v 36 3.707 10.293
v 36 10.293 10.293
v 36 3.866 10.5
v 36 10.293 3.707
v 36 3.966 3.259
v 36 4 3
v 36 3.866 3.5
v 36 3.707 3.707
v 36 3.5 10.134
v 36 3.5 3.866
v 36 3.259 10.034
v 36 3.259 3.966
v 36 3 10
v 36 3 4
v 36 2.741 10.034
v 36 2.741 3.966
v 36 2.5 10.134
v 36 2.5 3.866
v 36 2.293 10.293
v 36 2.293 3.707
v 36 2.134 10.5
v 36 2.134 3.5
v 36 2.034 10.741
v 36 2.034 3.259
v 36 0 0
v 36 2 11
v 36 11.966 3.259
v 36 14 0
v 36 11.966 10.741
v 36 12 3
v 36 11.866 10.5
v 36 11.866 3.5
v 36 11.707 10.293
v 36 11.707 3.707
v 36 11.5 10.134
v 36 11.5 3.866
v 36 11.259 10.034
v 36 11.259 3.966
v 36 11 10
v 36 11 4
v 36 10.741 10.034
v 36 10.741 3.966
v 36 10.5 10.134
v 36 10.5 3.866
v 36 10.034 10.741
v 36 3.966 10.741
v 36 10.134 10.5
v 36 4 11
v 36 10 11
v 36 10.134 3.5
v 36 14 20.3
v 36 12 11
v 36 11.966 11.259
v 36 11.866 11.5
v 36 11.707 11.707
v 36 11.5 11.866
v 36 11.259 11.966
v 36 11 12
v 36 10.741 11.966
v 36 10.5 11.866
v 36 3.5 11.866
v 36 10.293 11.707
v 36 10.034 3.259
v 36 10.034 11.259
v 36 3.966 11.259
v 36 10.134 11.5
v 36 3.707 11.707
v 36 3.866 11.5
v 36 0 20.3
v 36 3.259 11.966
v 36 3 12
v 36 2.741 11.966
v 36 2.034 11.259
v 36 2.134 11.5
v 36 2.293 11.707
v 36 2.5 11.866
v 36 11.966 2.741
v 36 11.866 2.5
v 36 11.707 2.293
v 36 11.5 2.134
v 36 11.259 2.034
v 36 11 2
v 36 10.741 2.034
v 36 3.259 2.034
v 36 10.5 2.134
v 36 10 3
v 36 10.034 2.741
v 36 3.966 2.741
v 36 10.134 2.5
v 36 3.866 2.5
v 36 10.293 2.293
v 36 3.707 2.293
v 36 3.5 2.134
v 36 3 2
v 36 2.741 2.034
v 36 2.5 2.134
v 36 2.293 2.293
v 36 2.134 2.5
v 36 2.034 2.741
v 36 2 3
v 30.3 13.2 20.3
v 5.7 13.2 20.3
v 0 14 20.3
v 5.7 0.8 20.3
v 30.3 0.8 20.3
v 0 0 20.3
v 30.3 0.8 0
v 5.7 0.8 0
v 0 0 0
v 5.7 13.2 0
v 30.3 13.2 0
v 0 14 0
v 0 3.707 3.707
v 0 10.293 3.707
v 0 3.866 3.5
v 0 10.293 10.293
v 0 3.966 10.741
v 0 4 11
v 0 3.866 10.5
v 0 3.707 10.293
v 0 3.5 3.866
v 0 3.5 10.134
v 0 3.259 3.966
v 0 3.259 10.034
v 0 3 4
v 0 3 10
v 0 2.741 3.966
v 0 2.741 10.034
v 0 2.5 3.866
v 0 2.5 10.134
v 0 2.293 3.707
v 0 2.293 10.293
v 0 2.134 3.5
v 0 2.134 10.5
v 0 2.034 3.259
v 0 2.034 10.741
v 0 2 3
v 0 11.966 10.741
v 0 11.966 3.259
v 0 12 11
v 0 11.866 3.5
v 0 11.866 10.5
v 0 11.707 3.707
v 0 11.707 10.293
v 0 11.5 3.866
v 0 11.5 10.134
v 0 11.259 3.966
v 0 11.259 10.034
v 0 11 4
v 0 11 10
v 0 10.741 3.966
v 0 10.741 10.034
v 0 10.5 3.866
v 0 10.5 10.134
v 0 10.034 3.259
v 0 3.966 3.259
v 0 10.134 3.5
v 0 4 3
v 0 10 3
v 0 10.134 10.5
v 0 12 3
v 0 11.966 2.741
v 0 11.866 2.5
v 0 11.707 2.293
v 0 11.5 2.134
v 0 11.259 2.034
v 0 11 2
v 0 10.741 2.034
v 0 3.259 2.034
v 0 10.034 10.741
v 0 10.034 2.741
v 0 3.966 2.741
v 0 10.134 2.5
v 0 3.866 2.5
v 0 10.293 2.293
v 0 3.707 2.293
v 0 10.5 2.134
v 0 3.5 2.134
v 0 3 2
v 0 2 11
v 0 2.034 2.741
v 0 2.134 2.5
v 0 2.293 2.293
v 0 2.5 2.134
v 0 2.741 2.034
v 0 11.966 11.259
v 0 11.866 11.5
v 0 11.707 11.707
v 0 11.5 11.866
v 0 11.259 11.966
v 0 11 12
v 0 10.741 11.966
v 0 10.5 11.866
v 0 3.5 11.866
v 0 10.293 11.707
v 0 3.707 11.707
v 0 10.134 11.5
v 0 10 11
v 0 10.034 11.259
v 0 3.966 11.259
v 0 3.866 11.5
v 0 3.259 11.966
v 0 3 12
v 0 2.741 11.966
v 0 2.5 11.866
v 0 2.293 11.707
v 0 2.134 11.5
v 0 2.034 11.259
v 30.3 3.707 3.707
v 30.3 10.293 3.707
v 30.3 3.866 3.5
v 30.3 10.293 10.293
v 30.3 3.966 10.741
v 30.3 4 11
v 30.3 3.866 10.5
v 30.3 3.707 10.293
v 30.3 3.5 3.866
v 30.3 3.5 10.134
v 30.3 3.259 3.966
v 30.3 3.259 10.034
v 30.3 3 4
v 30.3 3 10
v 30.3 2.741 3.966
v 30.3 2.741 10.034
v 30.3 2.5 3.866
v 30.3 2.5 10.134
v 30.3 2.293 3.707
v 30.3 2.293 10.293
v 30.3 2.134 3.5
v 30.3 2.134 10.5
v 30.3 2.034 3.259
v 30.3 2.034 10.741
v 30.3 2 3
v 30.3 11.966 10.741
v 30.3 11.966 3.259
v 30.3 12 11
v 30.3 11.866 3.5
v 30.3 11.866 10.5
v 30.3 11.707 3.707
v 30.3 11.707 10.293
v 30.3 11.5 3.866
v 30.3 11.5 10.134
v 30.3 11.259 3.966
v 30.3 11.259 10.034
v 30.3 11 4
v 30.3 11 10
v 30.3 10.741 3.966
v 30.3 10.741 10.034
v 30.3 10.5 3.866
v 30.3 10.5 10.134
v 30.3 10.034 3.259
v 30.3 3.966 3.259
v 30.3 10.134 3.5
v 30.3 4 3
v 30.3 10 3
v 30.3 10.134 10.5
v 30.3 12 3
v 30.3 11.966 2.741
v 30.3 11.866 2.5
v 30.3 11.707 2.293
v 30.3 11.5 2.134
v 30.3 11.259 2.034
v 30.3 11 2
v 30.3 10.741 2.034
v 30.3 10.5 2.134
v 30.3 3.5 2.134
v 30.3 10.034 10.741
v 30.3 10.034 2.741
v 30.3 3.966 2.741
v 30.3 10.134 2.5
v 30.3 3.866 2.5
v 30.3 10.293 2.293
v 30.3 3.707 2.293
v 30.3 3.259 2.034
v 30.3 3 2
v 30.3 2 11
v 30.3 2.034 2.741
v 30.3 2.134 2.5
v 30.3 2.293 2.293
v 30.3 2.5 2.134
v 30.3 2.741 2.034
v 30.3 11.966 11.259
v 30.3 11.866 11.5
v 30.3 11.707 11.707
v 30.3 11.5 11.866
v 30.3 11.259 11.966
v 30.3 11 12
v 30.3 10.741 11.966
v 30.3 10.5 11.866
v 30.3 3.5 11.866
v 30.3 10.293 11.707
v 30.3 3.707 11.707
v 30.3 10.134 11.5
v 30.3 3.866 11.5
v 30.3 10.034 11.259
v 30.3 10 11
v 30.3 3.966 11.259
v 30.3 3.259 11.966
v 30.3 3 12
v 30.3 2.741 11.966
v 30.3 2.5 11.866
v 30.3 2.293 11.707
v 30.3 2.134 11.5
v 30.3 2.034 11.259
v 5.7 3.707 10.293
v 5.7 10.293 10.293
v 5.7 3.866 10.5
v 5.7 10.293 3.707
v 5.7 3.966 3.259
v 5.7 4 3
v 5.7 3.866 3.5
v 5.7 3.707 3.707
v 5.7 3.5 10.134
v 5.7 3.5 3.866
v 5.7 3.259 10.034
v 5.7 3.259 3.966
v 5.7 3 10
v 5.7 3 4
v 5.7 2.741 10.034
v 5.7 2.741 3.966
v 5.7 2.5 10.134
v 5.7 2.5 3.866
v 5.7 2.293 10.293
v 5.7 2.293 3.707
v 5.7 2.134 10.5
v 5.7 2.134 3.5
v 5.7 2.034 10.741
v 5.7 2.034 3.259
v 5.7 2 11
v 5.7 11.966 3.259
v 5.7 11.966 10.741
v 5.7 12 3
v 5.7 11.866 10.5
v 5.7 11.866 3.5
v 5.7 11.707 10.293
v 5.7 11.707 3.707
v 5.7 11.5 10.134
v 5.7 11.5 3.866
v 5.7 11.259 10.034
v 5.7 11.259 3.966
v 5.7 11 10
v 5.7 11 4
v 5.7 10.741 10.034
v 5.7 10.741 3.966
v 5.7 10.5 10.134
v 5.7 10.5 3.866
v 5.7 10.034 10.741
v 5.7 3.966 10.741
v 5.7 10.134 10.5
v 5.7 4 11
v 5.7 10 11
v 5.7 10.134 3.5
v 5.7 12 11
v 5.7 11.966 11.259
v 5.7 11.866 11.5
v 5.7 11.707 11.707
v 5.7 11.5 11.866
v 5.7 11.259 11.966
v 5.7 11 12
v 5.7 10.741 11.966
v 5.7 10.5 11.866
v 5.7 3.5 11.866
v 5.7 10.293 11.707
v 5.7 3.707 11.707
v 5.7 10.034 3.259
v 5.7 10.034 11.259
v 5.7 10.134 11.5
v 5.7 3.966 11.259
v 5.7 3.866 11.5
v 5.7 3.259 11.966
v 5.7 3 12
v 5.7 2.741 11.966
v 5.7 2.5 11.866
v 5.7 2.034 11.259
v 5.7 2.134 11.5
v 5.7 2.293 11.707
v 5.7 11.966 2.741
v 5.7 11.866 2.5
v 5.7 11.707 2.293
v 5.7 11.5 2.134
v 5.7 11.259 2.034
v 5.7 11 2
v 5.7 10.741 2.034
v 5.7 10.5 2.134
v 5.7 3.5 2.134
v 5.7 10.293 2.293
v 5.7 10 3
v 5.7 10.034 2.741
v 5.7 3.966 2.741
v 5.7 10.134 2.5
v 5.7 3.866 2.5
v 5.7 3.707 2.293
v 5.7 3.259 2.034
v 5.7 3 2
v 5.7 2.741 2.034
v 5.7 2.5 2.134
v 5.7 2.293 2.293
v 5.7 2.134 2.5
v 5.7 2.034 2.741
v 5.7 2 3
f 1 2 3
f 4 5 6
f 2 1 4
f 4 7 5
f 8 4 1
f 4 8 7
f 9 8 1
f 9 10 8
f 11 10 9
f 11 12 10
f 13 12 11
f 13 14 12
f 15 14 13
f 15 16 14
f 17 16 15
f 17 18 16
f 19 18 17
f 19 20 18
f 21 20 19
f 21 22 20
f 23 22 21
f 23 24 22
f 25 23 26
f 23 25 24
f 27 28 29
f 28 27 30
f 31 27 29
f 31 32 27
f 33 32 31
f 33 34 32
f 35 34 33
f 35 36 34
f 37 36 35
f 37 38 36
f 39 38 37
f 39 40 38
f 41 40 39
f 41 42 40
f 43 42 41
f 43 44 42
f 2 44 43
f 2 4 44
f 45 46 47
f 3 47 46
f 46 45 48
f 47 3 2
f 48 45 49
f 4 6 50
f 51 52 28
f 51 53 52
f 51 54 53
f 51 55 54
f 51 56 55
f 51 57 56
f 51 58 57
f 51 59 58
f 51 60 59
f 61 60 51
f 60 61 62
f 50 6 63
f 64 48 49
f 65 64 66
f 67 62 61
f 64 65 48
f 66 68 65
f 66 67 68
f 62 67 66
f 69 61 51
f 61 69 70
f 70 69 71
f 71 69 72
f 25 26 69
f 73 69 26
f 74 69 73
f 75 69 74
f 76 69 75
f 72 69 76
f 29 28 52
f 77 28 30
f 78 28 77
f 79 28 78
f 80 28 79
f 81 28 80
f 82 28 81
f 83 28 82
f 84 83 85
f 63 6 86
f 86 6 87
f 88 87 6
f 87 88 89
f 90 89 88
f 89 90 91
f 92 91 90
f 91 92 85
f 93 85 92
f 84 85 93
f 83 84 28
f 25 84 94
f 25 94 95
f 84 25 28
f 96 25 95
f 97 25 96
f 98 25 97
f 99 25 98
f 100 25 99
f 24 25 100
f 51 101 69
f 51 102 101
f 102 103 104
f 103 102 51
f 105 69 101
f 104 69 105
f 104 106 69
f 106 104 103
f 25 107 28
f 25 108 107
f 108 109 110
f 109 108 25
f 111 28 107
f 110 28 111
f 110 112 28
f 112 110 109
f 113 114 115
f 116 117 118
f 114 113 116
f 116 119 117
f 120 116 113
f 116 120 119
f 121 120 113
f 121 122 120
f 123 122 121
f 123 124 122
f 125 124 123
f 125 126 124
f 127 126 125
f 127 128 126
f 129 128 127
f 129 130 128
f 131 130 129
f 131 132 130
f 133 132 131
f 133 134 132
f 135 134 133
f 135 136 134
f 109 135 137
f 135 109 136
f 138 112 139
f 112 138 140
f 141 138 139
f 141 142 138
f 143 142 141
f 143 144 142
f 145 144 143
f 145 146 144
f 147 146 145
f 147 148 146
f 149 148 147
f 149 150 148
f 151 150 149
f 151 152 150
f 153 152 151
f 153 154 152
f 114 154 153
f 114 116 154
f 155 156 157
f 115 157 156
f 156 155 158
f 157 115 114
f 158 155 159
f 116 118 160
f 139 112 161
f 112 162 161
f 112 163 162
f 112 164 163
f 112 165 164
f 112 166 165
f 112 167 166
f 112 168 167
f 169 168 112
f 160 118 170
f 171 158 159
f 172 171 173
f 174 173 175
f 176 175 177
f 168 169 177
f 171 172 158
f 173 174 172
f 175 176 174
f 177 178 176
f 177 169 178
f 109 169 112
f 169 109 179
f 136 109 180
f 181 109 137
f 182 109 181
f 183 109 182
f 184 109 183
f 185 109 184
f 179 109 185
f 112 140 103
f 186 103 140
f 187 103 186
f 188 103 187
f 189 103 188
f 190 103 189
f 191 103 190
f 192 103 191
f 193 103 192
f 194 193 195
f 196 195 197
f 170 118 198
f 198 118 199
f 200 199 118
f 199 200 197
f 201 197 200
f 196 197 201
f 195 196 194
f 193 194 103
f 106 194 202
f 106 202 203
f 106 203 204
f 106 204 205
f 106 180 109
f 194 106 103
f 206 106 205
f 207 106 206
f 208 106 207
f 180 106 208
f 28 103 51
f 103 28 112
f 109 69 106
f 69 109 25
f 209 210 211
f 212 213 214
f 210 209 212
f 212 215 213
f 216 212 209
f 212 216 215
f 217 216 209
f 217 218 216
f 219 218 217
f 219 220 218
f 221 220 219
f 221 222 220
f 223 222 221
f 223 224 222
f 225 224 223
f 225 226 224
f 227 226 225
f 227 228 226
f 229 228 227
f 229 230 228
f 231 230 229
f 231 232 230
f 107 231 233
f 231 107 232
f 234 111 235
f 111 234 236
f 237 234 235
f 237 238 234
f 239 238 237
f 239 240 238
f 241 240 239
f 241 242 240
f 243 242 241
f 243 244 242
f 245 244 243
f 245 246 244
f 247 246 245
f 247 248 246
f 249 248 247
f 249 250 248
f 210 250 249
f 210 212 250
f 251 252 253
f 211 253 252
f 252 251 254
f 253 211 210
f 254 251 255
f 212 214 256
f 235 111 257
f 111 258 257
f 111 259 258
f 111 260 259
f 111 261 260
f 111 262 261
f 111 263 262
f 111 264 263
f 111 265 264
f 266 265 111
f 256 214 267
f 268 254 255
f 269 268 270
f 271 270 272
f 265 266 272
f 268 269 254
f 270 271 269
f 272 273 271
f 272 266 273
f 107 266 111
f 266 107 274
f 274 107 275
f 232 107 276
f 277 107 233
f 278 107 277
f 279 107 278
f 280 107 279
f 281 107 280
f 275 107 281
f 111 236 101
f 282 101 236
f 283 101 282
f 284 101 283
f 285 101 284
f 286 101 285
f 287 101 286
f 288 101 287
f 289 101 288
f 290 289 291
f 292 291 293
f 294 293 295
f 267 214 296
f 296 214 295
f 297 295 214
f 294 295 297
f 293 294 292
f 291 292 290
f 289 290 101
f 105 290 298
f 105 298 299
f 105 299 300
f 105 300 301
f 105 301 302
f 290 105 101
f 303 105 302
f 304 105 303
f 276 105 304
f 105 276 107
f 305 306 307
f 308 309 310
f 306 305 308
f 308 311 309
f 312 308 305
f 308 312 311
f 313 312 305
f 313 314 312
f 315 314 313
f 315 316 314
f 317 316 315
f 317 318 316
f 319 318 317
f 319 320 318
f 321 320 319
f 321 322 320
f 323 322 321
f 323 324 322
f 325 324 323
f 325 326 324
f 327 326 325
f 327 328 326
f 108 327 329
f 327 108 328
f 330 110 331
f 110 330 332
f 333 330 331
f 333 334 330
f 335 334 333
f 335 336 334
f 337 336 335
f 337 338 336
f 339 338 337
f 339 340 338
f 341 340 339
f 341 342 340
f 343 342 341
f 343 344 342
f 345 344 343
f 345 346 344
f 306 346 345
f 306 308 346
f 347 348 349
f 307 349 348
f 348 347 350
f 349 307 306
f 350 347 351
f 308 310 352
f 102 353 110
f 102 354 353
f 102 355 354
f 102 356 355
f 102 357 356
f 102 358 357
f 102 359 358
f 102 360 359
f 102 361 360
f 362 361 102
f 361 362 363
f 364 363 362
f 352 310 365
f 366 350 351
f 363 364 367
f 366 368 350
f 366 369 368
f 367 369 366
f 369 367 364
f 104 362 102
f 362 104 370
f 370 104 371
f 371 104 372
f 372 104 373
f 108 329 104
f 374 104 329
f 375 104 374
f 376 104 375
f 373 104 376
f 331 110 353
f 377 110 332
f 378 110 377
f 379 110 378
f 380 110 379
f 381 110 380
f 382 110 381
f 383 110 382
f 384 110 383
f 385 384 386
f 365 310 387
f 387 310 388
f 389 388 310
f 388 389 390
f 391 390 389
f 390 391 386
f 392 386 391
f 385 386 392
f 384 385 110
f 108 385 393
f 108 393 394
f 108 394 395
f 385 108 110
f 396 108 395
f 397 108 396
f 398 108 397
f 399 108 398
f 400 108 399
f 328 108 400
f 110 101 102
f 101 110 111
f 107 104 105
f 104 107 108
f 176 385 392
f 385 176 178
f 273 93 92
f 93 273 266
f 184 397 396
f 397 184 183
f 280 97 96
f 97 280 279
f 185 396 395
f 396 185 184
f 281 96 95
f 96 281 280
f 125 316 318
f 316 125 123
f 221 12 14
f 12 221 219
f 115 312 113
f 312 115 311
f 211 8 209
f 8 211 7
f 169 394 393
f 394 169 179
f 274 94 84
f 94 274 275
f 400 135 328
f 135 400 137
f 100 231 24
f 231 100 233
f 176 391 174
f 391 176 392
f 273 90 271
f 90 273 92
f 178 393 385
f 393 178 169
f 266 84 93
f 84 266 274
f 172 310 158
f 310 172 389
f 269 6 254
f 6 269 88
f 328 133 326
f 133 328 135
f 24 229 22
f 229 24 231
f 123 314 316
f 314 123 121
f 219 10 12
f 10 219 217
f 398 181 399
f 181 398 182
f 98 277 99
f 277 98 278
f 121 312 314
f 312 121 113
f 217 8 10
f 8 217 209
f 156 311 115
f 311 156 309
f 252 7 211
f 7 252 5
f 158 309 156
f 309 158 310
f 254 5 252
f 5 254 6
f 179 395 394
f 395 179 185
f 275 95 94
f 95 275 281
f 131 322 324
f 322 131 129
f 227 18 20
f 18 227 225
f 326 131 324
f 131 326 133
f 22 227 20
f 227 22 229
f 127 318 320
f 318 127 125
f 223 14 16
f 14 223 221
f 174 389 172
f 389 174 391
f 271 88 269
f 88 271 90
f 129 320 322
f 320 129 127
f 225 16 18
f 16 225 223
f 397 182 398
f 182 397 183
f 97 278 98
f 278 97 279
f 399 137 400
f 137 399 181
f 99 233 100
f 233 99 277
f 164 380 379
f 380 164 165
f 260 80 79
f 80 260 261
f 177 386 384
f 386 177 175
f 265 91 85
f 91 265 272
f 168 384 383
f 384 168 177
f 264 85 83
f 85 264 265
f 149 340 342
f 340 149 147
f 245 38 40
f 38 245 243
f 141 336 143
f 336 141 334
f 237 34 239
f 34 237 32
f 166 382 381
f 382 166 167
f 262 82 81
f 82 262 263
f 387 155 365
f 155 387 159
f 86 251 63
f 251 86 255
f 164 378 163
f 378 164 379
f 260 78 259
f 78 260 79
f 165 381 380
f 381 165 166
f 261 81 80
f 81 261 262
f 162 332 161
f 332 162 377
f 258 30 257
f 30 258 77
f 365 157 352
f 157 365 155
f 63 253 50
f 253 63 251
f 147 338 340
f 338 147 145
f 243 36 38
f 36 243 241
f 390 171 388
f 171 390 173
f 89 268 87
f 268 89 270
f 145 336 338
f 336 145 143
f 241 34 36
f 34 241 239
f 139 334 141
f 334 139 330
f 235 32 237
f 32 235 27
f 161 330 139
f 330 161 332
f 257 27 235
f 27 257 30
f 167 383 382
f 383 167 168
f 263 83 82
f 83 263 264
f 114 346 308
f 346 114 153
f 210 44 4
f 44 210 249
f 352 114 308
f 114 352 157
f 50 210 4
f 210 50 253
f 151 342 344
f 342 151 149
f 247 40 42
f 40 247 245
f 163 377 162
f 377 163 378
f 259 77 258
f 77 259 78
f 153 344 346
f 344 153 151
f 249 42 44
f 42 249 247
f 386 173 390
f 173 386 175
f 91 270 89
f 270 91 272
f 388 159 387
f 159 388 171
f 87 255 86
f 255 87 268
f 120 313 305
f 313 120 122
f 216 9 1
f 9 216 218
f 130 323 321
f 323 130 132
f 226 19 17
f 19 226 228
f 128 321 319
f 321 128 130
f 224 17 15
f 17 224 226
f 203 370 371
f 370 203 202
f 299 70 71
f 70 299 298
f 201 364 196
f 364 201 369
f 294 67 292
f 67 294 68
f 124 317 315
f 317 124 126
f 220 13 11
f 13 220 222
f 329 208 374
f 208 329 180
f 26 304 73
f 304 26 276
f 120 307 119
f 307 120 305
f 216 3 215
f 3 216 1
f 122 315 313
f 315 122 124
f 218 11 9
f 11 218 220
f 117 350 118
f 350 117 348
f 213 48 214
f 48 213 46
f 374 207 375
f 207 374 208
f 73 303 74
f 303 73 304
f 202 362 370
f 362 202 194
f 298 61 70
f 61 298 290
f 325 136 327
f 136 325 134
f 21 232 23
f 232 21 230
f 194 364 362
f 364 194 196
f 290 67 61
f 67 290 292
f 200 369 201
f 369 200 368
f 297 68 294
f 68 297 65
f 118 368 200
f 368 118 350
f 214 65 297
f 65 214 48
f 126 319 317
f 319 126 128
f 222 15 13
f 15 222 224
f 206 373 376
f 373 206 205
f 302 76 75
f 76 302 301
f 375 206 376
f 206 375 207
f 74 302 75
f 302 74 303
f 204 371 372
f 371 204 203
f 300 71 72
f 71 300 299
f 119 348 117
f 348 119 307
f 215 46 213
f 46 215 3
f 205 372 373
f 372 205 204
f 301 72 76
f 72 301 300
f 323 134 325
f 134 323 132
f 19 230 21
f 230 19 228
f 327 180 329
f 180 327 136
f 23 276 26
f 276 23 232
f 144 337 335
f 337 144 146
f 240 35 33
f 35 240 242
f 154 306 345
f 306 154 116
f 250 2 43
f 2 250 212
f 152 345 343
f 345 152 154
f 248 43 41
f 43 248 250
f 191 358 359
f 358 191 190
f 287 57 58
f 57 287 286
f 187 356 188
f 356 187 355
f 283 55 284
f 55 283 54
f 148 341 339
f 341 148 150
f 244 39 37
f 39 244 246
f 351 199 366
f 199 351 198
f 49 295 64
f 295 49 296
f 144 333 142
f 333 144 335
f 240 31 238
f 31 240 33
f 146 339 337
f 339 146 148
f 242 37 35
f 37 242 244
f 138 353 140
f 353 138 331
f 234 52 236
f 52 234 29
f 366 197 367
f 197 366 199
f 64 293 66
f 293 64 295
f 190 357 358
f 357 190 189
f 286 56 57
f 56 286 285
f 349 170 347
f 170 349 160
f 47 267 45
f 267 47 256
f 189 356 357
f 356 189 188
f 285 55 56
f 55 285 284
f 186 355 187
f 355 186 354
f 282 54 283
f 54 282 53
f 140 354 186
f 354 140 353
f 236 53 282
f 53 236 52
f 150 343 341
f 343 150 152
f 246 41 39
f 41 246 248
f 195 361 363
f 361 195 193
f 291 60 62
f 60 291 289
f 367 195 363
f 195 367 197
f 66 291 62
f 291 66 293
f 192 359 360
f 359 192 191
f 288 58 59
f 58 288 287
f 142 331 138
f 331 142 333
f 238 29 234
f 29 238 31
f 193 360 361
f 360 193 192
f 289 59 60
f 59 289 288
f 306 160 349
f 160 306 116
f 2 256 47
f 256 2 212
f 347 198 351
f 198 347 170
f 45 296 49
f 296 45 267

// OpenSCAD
// file: servo_9g.scad
//servo_9g(false);

//use<hub_mount.scad>
use<MCAD/nuts_and_bolts.scad>
$fn = 24;
//x,y,z => l,w,h
servo_l         = 12;
servo_w         = 23;
body_h          = 23;

servo_h         = 27; //not used in code

wing_w          = 5;
wing_h          = 2.33;
wing_place      = 18.3;   
hole_offset     = 2.5;    //not checked
mount_hole_r    = 2/2;
mount_slot      = 1;

servo_ww        = servo_w+wing_w*2; // not used in code but is handy number

hub_h           = 4;
small_hub_r     = 5.68/2;  
horn_r          = 4.66/2;
horn_h          = 3;

wire_l          = 4;
wire_w          = 1.5;
wire_h          = 1;
wire_place      = 4.8;

servo_full_w    = servo_w+wing_w*2;

//servo_9g(true, false);
module servo_9g(hole=false, wings = true) {
    //if a differnce is applied and you want 
    if(hole) {
        translate([servo_l/2,-hole_offset,-10]) 
        cylinder(r=mount_hole_r,h=40);
        translate([servo_l/2,hole_offset+servo_w,-10]) 
        cylinder(r=mount_hole_r,h=40);
        /*translate([servo_l/2,servo_l/2,-15])
        cylinder(r=1.5,h=15);*/
        
        /*translate([servo_l/2,servo_l/2,body_h+hub_h+5])
        #hub_mount();*/
    }
    color("white") translate([servo_l/2,servo_l/2,body_h+hub_h])
    cylinder(r=horn_r,h=horn_h);
    
    color("deepSkyBlue",.7) 
    union() {
        cube([servo_l,servo_w,body_h]);
        translate([servo_l/2,servo_l/2,body_h])
        cylinder(r=servo_l/2,h=hub_h);
        translate([servo_l/2,servo_l+small_hub_r/2,body_h])
        cylinder(r=small_hub_r,h=hub_h);
        
        if(wings) {
            translate([0,servo_w,wing_place])
            difference() {
                cube([servo_l,wing_w,wing_h]);
                translate([servo_l/2,hole_offset,0]) 
                cylinder(r=mount_hole_r,h=5);
                translate([servo_l/2-mount_slot/2,hole_offset+mount_hole_r/2,0])
                if(hole) cube([mount_slot,4,3]);
            }
        
            translate([servo_l,0,wing_place])
            rotate([0,0,180])
            difference() {
                cube([servo_l,wing_w,wing_h]);
                translate([servo_l/2,hole_offset,0]) 
                cylinder(r=mount_hole_r,h=5);
                translate([servo_l/2-mount_slot/2,hole_offset+mount_hole_r/2,0])
                if(hole) cube([mount_slot,4,3]);
            }
        }
    }
    
    /*color("brown") translate([(servo_l-wire_l)/2,-wire_w,wire_place])
    cube([wire_l,wire_w,wire_h]);*/
}
// main file
include<servo_9g.scad>

mount_x = 36;
mount_y = servo_l+2;
servo_tol   = 0.2;
servo_x     = servo_l + servo_tol*2; //~12
servo_y     = servo_w + servo_tol*8; //~23



difference() {
    union() {
        cube([mount_x,mount_y,wing_place+2]);
    }
    translate([mount_x/2,mount_y/2,19])
    cube([servo_y, servo_x, 40], center = true);
    
    
    translate([(36-servo_y)/2+servo_y-4*servo_tol,(mount_y-servo_l)/2,2])
    rotate([0,0,90])
    servo_9g(false);
    
    translate([-1,3,3])
    rotate([0,90,0])
    cylinder(r=1, h=50);
    translate([-1,mount_y-3,3])
    rotate([0,90,0])
    cylinder(r=1, h=50);
    translate([-1,3,3+8])
    rotate([0,90,0])
    cylinder(r=1, h=50);
    translate([-1,mount_y-3,3+8])
    rotate([0,90,0])
    cylinder(r=1, h=50);
}
